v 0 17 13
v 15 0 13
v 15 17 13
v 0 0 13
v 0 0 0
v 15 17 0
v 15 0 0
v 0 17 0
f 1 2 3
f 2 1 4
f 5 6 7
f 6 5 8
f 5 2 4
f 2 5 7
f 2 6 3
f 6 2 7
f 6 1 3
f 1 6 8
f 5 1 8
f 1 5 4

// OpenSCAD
// Generated by SolidPython 1.0.1 on 2020-07-29 00:46:55


cube(size = [15, 17, 13]);
/***********************************************
*********      SolidPython code:      **********
************************************************
 
# import packages: SolidPython
from solid import *
from solid.utils import *
from itertools import chain, combinations, permutations


class Resize:

    def __init__(self, scad_file):
        self.scad_file = scad_file
        #self.scad_file = import_scad(scad_file)
        # cone/cylinder param:
        self.r1 = 0
        self.r2 = 0
        self.h = 0
        # rectangular prism param:
        self.w = 0
        self.l = 0
        # ellipse param:
        self.r = 0

    # import OpenScad code (file name corresponds to shape)


    # classify shape + parameters
    def assign(self, param1, param2, param3):
        if self.scad_file == 'cone.scad':
            self.r1 = param1
            self.r2 = param2
            self.h = param3
        elif self.scad_file == 'cylinder.scad':
            self.r1 = param1
            self.r2 = param2
            self.h = param3
        elif self.scad_file == 'rectangularPrism.scad':
            self.h = param1
            self.l = param2
            self.w = param3
        else:
            self.r = param1
            self.h = param2

    # resize parameters
    def iterate(self):
        x = range(3, 20, 2)
        i = 1
        if self.scad_file == 'cone.scad':
            tempList = list(permutations(x, 2))
            for temp in tempList:
                param1 = temp[0]
                param2 = temp[1]
                filepath = 'produced_scad_files/' + 'cone' + str(param1) + '_' + str(param2) + '_' + '.scad'
                scad_render_to_file(cylinder(h=param1, r1=param2, r2=0), filepath)

        elif self.scad_file == 'cylinder.scad':
            tempList = list(permutations(x, 3))
            for temp in tempList:
                param1 = temp[0]
                param2 = temp[1]
                filepath = 'produced_scad_files/' + 'cylinder' + str(param1) + '_' + str(param2) + '_' + '.scad'
                scad_render_to_file(cylinder(h=param1, r1=param2, r2=param2), filepath)

        elif self.scad_file == 'rectangularPrism.scad':
            tempList = list(permutations(x, 3))
            for temp in tempList:
                param1 = temp[0]
                param2 = temp[1]
                param3 = temp[2]
                filepath = 'produced_scad_files/' + 'rectangularPrism' + str(param1) + '_' + str(param2) + '_' + str(
                    param3) + '.scad'
                scad_render_to_file(cube(size=(param1, param2, param3)), filepath)

        elif self.scad_file == 'ellipse.scad':
            tempList = list(permutations(x, 4))
            for temp in tempList:
                param1 = temp[0]
                param2 = temp[1]
                param3 = temp[2]
                param4 = temp[3]
                filepath = 'produced_scad_files/' + 'ellipse' + str(param1) + '_' + str(param2) + '_' + str(param3) + '_' + str(param4) + '.scad'
                scad_render_to_file(scale([param1, param2, param3])(sphere(r=param4)), filepath)

    def render_to_scadfile(self):
        scad_render_to_file(scad, 'example.scad') 
 
************************************************/
